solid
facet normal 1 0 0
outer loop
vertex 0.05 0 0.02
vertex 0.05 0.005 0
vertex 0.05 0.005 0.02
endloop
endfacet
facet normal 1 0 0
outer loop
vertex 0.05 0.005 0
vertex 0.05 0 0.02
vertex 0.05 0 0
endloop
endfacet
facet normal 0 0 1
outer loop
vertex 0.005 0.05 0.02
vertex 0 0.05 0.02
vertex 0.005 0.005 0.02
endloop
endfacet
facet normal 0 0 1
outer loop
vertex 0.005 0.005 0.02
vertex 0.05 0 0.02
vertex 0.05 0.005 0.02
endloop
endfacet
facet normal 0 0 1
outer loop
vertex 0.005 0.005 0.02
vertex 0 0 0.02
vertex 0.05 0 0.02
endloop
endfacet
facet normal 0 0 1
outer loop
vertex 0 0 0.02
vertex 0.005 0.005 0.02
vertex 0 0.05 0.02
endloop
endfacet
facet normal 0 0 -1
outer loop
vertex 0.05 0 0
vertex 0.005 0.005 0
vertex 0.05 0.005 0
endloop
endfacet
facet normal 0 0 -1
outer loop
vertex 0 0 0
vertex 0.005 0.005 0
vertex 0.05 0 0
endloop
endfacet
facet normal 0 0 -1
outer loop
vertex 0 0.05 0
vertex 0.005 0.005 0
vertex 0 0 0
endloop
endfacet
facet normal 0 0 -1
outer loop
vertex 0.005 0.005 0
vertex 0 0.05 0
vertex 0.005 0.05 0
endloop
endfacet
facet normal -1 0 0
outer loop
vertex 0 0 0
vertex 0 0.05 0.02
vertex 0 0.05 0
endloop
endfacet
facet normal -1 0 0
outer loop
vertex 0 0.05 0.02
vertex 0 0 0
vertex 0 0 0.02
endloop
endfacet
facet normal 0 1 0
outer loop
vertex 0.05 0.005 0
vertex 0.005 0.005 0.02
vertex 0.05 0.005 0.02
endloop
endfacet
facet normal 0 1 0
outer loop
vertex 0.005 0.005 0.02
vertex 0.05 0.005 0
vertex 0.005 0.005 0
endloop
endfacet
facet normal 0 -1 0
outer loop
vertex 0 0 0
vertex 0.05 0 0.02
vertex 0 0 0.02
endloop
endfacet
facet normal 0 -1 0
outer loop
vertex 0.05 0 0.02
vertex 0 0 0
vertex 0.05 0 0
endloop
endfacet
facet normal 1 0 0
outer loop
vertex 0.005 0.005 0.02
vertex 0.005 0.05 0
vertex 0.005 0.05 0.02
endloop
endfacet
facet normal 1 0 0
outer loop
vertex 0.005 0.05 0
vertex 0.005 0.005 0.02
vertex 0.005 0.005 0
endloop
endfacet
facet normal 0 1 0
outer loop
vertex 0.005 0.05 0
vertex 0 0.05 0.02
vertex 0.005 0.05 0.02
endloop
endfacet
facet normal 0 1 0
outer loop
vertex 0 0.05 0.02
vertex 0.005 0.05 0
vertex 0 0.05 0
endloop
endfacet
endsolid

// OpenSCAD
// Simple L-bracket fixture used by tests/integration/test_openscad_compile.py
// to verify the real OpenSCAD binary compiles and produces sane STL bounds.
width = 0.05;
height = 0.05;
depth = 0.02;
thickness = 0.005;

union() {
    cube([width, thickness, depth]);
    cube([thickness, height, depth]);
}
